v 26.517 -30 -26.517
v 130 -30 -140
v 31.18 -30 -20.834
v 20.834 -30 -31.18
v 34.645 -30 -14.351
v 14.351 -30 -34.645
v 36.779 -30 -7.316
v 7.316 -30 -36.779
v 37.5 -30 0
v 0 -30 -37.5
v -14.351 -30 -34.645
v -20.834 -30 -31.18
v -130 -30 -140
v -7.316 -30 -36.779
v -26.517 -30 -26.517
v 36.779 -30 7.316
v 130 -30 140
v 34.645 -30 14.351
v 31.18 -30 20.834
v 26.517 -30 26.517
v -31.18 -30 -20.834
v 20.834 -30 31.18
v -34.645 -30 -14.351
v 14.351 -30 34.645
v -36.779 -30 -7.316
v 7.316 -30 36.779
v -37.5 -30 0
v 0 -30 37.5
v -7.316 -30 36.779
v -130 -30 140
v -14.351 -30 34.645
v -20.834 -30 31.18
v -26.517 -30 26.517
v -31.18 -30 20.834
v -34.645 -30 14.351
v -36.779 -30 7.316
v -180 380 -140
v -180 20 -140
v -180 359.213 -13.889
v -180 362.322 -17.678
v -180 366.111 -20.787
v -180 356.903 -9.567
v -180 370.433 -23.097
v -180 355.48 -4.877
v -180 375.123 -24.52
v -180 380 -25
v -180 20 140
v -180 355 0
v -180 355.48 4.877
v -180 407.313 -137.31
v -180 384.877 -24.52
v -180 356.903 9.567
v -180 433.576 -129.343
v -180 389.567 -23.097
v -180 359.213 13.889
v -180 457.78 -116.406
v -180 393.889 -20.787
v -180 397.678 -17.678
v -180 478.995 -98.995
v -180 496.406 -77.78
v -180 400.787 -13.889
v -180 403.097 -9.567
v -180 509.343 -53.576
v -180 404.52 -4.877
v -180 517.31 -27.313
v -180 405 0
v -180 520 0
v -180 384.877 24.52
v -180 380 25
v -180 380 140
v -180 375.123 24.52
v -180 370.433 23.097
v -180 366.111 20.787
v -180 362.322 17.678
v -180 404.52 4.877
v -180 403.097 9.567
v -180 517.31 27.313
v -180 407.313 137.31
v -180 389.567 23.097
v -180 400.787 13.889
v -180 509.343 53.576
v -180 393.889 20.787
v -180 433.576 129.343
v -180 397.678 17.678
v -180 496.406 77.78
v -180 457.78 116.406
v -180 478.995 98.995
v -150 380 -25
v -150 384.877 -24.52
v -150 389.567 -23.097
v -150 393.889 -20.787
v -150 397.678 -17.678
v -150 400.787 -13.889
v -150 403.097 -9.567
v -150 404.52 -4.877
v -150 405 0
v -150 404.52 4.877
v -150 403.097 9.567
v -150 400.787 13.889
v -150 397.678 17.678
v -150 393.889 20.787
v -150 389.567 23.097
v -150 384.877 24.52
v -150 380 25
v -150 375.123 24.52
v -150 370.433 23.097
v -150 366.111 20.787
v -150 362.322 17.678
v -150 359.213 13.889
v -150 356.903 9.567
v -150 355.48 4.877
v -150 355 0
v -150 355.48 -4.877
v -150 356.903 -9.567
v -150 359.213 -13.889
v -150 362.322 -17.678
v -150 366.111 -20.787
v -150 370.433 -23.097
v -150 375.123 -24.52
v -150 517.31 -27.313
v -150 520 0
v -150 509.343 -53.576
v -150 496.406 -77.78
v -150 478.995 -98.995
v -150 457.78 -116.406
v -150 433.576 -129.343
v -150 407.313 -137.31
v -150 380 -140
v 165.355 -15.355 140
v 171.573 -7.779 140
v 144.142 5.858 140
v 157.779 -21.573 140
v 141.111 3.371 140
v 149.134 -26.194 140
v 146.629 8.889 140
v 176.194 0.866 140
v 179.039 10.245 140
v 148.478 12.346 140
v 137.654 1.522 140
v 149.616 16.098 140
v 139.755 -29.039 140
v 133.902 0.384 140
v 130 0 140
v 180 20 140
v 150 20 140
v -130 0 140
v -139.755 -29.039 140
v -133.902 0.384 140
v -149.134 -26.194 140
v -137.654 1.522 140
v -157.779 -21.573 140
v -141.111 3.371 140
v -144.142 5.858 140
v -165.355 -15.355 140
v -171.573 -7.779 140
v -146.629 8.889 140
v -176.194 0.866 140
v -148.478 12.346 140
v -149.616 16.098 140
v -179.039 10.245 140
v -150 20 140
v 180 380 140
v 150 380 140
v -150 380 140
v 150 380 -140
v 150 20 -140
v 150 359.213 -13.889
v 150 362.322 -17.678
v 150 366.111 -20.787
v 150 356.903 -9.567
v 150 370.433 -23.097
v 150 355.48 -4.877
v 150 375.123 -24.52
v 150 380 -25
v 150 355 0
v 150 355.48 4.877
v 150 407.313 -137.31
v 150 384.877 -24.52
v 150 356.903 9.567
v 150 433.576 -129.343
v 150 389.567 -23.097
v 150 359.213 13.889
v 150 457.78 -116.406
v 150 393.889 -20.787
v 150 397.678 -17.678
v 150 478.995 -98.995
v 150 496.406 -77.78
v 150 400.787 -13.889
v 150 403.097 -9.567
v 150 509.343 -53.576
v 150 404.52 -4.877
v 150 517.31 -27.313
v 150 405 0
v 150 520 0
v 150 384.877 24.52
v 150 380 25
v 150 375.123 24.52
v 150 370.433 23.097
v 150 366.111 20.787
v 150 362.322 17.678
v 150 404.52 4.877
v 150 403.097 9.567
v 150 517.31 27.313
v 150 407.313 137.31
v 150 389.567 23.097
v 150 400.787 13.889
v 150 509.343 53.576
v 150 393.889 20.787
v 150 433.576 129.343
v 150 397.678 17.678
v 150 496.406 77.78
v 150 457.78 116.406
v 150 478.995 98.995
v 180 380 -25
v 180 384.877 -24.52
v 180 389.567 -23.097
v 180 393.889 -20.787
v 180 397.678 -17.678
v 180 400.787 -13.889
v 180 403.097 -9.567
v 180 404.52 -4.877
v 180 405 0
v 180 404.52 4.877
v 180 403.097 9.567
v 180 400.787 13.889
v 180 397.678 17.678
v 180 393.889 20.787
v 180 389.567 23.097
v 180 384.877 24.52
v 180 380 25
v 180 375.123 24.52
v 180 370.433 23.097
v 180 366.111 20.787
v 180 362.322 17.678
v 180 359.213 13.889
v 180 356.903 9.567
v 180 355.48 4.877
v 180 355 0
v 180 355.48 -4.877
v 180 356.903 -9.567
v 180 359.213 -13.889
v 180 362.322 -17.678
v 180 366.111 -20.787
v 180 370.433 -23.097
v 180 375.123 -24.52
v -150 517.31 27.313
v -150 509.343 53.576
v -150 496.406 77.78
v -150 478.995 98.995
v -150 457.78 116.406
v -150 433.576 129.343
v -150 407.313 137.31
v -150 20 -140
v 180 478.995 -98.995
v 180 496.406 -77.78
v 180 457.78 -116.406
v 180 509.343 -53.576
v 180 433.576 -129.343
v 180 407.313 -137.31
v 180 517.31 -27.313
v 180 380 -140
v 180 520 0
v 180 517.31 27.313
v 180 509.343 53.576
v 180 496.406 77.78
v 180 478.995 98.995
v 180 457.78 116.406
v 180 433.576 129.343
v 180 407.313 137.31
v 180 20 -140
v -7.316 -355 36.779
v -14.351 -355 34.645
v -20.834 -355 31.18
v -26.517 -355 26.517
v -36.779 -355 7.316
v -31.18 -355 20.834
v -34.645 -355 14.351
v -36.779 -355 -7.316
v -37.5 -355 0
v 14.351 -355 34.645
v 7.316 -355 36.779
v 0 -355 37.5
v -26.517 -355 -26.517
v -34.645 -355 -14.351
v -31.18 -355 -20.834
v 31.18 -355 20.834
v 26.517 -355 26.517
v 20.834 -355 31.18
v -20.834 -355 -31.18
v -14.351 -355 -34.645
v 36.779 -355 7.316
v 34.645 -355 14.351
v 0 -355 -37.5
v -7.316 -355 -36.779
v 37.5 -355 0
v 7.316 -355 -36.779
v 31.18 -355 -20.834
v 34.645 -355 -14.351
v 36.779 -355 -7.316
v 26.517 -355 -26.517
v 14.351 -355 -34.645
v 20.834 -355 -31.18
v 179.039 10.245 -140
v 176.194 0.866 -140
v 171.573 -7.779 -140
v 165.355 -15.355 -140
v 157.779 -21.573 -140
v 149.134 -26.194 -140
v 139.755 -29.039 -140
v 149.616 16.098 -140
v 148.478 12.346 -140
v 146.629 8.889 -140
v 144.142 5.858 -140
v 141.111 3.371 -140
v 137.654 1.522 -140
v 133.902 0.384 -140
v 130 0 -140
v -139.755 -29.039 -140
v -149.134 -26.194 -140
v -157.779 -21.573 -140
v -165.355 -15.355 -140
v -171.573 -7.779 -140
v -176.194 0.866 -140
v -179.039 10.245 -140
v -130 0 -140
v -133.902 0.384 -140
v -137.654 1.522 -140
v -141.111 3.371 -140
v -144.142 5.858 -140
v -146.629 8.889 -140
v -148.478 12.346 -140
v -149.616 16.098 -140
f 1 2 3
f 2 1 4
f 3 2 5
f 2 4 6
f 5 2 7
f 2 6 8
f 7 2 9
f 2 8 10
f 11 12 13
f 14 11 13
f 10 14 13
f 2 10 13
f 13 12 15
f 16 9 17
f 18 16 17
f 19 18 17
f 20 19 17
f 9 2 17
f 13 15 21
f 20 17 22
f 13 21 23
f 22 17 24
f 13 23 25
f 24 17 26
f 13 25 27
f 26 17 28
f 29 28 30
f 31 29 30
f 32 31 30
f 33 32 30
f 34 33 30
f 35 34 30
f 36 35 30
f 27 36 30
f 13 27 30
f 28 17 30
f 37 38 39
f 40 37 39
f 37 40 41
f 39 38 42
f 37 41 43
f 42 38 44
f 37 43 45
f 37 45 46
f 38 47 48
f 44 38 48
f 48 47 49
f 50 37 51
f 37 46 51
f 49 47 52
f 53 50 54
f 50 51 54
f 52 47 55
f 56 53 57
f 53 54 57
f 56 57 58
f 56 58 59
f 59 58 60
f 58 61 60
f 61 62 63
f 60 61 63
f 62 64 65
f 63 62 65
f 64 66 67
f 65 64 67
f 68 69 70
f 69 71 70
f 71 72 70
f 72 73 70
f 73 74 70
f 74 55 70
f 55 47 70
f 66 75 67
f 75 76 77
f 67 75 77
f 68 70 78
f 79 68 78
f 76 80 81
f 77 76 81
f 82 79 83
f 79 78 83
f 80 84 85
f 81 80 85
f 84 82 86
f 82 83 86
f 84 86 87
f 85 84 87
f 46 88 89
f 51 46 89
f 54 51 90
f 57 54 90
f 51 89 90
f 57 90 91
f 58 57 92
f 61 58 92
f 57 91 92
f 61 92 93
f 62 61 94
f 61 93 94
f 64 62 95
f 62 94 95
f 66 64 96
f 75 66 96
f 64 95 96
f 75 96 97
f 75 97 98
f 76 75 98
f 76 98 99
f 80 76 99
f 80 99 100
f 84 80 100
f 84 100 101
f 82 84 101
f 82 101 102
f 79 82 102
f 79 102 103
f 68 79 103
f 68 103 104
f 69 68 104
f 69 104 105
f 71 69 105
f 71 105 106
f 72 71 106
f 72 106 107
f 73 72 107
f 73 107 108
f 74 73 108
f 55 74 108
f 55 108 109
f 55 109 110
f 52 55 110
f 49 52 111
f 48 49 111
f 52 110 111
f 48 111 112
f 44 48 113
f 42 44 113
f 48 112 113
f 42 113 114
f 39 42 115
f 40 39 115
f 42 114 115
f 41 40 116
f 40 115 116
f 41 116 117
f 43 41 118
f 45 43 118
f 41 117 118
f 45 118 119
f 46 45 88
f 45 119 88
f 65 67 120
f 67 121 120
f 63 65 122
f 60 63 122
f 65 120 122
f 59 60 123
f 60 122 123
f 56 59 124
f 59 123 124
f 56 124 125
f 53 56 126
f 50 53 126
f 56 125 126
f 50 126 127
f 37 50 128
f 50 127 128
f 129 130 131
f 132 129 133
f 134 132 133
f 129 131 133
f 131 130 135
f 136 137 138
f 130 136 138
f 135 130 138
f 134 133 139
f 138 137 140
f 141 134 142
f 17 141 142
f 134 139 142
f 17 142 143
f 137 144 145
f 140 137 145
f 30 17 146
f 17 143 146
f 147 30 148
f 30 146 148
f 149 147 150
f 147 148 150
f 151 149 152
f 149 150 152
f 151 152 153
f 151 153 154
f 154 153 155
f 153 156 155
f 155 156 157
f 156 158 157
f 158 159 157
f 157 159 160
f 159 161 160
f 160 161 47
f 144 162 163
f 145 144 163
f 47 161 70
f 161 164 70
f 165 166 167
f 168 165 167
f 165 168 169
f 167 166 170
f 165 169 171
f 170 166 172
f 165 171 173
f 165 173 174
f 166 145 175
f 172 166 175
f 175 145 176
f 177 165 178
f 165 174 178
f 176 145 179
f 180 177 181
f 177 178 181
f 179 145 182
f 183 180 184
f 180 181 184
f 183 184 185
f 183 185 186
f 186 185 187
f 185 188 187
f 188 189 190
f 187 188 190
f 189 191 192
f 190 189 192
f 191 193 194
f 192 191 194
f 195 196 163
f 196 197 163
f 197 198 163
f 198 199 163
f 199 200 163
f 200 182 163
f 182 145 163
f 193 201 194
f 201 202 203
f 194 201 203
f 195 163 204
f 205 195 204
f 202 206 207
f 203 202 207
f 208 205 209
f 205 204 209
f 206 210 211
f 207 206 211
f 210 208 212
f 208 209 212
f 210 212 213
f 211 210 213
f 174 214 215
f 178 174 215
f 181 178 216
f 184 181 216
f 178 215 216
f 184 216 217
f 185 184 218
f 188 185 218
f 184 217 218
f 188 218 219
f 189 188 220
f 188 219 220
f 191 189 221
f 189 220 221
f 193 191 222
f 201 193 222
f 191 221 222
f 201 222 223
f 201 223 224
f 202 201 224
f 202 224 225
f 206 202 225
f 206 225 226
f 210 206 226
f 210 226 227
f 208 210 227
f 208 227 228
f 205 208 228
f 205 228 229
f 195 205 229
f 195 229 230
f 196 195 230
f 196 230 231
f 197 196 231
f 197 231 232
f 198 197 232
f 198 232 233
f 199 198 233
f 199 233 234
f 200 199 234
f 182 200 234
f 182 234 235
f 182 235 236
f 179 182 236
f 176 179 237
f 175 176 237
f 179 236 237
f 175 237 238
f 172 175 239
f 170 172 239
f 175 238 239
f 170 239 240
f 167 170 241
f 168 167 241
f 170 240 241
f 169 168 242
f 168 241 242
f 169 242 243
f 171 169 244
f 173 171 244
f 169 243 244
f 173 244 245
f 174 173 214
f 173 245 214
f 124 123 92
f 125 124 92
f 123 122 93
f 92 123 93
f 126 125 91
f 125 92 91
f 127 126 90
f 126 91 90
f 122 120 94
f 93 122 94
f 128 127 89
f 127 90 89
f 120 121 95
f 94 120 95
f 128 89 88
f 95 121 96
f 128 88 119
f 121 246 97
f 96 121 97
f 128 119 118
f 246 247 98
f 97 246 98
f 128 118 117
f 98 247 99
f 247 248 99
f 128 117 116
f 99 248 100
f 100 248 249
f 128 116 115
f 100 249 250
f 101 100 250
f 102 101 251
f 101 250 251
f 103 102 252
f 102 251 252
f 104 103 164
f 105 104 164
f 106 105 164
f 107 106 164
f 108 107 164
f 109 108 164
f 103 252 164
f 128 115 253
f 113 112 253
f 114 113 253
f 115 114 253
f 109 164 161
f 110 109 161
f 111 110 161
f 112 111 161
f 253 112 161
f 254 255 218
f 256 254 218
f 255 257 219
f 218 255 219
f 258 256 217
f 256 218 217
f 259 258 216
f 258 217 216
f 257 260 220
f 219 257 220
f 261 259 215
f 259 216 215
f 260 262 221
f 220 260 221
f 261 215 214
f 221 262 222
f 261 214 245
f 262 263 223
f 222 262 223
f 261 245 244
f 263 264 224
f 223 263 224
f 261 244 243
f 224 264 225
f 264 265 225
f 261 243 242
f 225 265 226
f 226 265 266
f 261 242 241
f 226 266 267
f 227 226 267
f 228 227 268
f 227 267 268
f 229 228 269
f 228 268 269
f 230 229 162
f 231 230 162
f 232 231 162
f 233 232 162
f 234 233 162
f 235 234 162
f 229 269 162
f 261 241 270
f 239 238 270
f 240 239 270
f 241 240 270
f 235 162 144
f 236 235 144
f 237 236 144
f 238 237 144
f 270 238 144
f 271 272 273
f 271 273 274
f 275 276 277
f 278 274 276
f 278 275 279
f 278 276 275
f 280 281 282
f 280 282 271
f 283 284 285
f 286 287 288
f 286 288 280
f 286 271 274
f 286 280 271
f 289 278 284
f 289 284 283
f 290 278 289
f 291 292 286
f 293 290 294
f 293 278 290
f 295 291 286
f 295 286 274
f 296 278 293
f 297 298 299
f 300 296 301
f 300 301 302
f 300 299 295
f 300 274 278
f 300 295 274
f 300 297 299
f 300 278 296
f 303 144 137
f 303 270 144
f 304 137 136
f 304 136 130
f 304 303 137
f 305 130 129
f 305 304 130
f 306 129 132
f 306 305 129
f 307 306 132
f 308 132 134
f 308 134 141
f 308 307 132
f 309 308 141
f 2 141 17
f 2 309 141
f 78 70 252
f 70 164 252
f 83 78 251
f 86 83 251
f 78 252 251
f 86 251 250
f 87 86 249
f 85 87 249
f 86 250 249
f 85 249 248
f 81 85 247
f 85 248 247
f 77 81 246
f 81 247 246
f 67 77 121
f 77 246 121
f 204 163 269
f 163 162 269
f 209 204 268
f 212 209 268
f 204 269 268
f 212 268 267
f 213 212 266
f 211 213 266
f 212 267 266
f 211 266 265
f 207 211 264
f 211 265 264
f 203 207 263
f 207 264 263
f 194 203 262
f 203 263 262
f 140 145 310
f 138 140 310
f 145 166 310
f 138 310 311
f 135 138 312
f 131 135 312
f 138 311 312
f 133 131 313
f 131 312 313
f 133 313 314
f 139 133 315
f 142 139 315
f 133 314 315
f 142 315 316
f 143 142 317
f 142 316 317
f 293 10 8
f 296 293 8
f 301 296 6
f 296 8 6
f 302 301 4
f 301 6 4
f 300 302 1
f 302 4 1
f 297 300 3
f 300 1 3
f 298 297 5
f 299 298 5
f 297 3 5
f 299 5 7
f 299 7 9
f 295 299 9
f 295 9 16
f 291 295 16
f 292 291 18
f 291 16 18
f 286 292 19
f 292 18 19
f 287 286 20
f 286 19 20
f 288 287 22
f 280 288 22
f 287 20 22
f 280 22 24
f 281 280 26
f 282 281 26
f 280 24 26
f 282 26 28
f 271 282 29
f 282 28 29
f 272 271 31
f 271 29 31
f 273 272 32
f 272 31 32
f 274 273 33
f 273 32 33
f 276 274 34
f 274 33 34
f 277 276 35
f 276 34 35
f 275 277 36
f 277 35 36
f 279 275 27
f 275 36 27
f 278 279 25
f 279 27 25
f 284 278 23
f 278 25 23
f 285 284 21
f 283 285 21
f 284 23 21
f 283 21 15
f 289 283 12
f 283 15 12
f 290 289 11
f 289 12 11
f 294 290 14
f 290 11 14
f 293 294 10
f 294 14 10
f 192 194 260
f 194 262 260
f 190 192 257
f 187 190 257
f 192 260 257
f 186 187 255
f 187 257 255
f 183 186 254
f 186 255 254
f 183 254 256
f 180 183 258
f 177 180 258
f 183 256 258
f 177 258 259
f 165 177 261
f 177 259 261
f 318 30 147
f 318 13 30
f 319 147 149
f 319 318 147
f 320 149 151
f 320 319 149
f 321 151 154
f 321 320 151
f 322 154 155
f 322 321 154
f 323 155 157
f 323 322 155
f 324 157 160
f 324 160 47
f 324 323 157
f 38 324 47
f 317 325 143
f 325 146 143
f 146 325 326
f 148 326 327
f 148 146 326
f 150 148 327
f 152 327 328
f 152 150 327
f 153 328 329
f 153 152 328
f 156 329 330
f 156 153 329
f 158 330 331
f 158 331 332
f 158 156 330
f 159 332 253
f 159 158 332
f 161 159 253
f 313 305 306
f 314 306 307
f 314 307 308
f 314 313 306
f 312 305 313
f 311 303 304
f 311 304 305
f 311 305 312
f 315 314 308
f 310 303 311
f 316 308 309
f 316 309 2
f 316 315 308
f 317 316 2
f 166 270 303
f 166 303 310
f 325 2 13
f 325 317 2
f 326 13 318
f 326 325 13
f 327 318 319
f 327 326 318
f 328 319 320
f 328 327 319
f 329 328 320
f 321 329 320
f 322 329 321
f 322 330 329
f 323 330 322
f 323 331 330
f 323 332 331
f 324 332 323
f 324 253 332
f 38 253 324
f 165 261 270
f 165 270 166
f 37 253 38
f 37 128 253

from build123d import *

# Parameters (mm, degrees)
BOSS_EXTRUDE1_DEPTH = 140
FILLET1_R           = 140
SKETCH2_R           = 25
CUT_EXTRUDE1_DEPTH  = 648.765389628
SKETCH3_R           = 37.5
BOSS_EXTRUDE2_DEPTH = 325
FILLET2_R           = 20
FILLET3_R           = 50


with BuildPart() as part:
    # Sketch1 → Boss-Extrude1 (new, symmetric)
    with BuildSketch(Plane.XY):
        Polygon((-150, 0), (150, 0), (150, 520), (180, 520), (180, -30), (-180, -30), (-180, 520), (-150, 520), align=None)
    extrude(amount=BOSS_EXTRUDE1_DEPTH, both=True)

    # Fillet1
    fillet1_edges = [part.edges().sort_by_distance(p)[0] for p in [
        (165, 520, 140),
        (165, 520, -140),
        (-165, 520, -140),
        (-165, 520, 140),
    ]]
    fillet(fillet1_edges, radius=FILLET1_R - 0.0001)  # a hair under: the kernel refuses the full size

    # Sketch2 → Cut-Extrude1 (cut, through all)
    with BuildSketch(Plane(origin=(180, 0, 0), x_dir=(0, 0, -1), z_dir=(1, 0, 0))):
        with Locations((0, 380)):
            Circle(SKETCH2_R)
    extrude(amount=-CUT_EXTRUDE1_DEPTH, mode=Mode.SUBTRACT)

    # Sketch3 → Boss-Extrude2 (add)
    with BuildSketch(Plane.XZ.offset(30)):
        with Locations(Location((0, 0, 0), (0, 0, 270))):
            Circle(SKETCH3_R)
    extrude(amount=BOSS_EXTRUDE2_DEPTH)

    # Fillet2
    fillet2_edges = [part.edges().sort_by_distance(p)[0] for p in [
        (-150, 0, 0),
        (150, 0, 0),
    ]]
    fillet(fillet2_edges, radius=FILLET2_R)

    # Fillet3
    fillet3_edges = [part.edges().sort_by_distance(p)[0] for p in [
        (180, -30, 0),
        (-180, -30, 0),
    ]]
    fillet(fillet3_edges, radius=FILLET3_R)


solid = part.part
